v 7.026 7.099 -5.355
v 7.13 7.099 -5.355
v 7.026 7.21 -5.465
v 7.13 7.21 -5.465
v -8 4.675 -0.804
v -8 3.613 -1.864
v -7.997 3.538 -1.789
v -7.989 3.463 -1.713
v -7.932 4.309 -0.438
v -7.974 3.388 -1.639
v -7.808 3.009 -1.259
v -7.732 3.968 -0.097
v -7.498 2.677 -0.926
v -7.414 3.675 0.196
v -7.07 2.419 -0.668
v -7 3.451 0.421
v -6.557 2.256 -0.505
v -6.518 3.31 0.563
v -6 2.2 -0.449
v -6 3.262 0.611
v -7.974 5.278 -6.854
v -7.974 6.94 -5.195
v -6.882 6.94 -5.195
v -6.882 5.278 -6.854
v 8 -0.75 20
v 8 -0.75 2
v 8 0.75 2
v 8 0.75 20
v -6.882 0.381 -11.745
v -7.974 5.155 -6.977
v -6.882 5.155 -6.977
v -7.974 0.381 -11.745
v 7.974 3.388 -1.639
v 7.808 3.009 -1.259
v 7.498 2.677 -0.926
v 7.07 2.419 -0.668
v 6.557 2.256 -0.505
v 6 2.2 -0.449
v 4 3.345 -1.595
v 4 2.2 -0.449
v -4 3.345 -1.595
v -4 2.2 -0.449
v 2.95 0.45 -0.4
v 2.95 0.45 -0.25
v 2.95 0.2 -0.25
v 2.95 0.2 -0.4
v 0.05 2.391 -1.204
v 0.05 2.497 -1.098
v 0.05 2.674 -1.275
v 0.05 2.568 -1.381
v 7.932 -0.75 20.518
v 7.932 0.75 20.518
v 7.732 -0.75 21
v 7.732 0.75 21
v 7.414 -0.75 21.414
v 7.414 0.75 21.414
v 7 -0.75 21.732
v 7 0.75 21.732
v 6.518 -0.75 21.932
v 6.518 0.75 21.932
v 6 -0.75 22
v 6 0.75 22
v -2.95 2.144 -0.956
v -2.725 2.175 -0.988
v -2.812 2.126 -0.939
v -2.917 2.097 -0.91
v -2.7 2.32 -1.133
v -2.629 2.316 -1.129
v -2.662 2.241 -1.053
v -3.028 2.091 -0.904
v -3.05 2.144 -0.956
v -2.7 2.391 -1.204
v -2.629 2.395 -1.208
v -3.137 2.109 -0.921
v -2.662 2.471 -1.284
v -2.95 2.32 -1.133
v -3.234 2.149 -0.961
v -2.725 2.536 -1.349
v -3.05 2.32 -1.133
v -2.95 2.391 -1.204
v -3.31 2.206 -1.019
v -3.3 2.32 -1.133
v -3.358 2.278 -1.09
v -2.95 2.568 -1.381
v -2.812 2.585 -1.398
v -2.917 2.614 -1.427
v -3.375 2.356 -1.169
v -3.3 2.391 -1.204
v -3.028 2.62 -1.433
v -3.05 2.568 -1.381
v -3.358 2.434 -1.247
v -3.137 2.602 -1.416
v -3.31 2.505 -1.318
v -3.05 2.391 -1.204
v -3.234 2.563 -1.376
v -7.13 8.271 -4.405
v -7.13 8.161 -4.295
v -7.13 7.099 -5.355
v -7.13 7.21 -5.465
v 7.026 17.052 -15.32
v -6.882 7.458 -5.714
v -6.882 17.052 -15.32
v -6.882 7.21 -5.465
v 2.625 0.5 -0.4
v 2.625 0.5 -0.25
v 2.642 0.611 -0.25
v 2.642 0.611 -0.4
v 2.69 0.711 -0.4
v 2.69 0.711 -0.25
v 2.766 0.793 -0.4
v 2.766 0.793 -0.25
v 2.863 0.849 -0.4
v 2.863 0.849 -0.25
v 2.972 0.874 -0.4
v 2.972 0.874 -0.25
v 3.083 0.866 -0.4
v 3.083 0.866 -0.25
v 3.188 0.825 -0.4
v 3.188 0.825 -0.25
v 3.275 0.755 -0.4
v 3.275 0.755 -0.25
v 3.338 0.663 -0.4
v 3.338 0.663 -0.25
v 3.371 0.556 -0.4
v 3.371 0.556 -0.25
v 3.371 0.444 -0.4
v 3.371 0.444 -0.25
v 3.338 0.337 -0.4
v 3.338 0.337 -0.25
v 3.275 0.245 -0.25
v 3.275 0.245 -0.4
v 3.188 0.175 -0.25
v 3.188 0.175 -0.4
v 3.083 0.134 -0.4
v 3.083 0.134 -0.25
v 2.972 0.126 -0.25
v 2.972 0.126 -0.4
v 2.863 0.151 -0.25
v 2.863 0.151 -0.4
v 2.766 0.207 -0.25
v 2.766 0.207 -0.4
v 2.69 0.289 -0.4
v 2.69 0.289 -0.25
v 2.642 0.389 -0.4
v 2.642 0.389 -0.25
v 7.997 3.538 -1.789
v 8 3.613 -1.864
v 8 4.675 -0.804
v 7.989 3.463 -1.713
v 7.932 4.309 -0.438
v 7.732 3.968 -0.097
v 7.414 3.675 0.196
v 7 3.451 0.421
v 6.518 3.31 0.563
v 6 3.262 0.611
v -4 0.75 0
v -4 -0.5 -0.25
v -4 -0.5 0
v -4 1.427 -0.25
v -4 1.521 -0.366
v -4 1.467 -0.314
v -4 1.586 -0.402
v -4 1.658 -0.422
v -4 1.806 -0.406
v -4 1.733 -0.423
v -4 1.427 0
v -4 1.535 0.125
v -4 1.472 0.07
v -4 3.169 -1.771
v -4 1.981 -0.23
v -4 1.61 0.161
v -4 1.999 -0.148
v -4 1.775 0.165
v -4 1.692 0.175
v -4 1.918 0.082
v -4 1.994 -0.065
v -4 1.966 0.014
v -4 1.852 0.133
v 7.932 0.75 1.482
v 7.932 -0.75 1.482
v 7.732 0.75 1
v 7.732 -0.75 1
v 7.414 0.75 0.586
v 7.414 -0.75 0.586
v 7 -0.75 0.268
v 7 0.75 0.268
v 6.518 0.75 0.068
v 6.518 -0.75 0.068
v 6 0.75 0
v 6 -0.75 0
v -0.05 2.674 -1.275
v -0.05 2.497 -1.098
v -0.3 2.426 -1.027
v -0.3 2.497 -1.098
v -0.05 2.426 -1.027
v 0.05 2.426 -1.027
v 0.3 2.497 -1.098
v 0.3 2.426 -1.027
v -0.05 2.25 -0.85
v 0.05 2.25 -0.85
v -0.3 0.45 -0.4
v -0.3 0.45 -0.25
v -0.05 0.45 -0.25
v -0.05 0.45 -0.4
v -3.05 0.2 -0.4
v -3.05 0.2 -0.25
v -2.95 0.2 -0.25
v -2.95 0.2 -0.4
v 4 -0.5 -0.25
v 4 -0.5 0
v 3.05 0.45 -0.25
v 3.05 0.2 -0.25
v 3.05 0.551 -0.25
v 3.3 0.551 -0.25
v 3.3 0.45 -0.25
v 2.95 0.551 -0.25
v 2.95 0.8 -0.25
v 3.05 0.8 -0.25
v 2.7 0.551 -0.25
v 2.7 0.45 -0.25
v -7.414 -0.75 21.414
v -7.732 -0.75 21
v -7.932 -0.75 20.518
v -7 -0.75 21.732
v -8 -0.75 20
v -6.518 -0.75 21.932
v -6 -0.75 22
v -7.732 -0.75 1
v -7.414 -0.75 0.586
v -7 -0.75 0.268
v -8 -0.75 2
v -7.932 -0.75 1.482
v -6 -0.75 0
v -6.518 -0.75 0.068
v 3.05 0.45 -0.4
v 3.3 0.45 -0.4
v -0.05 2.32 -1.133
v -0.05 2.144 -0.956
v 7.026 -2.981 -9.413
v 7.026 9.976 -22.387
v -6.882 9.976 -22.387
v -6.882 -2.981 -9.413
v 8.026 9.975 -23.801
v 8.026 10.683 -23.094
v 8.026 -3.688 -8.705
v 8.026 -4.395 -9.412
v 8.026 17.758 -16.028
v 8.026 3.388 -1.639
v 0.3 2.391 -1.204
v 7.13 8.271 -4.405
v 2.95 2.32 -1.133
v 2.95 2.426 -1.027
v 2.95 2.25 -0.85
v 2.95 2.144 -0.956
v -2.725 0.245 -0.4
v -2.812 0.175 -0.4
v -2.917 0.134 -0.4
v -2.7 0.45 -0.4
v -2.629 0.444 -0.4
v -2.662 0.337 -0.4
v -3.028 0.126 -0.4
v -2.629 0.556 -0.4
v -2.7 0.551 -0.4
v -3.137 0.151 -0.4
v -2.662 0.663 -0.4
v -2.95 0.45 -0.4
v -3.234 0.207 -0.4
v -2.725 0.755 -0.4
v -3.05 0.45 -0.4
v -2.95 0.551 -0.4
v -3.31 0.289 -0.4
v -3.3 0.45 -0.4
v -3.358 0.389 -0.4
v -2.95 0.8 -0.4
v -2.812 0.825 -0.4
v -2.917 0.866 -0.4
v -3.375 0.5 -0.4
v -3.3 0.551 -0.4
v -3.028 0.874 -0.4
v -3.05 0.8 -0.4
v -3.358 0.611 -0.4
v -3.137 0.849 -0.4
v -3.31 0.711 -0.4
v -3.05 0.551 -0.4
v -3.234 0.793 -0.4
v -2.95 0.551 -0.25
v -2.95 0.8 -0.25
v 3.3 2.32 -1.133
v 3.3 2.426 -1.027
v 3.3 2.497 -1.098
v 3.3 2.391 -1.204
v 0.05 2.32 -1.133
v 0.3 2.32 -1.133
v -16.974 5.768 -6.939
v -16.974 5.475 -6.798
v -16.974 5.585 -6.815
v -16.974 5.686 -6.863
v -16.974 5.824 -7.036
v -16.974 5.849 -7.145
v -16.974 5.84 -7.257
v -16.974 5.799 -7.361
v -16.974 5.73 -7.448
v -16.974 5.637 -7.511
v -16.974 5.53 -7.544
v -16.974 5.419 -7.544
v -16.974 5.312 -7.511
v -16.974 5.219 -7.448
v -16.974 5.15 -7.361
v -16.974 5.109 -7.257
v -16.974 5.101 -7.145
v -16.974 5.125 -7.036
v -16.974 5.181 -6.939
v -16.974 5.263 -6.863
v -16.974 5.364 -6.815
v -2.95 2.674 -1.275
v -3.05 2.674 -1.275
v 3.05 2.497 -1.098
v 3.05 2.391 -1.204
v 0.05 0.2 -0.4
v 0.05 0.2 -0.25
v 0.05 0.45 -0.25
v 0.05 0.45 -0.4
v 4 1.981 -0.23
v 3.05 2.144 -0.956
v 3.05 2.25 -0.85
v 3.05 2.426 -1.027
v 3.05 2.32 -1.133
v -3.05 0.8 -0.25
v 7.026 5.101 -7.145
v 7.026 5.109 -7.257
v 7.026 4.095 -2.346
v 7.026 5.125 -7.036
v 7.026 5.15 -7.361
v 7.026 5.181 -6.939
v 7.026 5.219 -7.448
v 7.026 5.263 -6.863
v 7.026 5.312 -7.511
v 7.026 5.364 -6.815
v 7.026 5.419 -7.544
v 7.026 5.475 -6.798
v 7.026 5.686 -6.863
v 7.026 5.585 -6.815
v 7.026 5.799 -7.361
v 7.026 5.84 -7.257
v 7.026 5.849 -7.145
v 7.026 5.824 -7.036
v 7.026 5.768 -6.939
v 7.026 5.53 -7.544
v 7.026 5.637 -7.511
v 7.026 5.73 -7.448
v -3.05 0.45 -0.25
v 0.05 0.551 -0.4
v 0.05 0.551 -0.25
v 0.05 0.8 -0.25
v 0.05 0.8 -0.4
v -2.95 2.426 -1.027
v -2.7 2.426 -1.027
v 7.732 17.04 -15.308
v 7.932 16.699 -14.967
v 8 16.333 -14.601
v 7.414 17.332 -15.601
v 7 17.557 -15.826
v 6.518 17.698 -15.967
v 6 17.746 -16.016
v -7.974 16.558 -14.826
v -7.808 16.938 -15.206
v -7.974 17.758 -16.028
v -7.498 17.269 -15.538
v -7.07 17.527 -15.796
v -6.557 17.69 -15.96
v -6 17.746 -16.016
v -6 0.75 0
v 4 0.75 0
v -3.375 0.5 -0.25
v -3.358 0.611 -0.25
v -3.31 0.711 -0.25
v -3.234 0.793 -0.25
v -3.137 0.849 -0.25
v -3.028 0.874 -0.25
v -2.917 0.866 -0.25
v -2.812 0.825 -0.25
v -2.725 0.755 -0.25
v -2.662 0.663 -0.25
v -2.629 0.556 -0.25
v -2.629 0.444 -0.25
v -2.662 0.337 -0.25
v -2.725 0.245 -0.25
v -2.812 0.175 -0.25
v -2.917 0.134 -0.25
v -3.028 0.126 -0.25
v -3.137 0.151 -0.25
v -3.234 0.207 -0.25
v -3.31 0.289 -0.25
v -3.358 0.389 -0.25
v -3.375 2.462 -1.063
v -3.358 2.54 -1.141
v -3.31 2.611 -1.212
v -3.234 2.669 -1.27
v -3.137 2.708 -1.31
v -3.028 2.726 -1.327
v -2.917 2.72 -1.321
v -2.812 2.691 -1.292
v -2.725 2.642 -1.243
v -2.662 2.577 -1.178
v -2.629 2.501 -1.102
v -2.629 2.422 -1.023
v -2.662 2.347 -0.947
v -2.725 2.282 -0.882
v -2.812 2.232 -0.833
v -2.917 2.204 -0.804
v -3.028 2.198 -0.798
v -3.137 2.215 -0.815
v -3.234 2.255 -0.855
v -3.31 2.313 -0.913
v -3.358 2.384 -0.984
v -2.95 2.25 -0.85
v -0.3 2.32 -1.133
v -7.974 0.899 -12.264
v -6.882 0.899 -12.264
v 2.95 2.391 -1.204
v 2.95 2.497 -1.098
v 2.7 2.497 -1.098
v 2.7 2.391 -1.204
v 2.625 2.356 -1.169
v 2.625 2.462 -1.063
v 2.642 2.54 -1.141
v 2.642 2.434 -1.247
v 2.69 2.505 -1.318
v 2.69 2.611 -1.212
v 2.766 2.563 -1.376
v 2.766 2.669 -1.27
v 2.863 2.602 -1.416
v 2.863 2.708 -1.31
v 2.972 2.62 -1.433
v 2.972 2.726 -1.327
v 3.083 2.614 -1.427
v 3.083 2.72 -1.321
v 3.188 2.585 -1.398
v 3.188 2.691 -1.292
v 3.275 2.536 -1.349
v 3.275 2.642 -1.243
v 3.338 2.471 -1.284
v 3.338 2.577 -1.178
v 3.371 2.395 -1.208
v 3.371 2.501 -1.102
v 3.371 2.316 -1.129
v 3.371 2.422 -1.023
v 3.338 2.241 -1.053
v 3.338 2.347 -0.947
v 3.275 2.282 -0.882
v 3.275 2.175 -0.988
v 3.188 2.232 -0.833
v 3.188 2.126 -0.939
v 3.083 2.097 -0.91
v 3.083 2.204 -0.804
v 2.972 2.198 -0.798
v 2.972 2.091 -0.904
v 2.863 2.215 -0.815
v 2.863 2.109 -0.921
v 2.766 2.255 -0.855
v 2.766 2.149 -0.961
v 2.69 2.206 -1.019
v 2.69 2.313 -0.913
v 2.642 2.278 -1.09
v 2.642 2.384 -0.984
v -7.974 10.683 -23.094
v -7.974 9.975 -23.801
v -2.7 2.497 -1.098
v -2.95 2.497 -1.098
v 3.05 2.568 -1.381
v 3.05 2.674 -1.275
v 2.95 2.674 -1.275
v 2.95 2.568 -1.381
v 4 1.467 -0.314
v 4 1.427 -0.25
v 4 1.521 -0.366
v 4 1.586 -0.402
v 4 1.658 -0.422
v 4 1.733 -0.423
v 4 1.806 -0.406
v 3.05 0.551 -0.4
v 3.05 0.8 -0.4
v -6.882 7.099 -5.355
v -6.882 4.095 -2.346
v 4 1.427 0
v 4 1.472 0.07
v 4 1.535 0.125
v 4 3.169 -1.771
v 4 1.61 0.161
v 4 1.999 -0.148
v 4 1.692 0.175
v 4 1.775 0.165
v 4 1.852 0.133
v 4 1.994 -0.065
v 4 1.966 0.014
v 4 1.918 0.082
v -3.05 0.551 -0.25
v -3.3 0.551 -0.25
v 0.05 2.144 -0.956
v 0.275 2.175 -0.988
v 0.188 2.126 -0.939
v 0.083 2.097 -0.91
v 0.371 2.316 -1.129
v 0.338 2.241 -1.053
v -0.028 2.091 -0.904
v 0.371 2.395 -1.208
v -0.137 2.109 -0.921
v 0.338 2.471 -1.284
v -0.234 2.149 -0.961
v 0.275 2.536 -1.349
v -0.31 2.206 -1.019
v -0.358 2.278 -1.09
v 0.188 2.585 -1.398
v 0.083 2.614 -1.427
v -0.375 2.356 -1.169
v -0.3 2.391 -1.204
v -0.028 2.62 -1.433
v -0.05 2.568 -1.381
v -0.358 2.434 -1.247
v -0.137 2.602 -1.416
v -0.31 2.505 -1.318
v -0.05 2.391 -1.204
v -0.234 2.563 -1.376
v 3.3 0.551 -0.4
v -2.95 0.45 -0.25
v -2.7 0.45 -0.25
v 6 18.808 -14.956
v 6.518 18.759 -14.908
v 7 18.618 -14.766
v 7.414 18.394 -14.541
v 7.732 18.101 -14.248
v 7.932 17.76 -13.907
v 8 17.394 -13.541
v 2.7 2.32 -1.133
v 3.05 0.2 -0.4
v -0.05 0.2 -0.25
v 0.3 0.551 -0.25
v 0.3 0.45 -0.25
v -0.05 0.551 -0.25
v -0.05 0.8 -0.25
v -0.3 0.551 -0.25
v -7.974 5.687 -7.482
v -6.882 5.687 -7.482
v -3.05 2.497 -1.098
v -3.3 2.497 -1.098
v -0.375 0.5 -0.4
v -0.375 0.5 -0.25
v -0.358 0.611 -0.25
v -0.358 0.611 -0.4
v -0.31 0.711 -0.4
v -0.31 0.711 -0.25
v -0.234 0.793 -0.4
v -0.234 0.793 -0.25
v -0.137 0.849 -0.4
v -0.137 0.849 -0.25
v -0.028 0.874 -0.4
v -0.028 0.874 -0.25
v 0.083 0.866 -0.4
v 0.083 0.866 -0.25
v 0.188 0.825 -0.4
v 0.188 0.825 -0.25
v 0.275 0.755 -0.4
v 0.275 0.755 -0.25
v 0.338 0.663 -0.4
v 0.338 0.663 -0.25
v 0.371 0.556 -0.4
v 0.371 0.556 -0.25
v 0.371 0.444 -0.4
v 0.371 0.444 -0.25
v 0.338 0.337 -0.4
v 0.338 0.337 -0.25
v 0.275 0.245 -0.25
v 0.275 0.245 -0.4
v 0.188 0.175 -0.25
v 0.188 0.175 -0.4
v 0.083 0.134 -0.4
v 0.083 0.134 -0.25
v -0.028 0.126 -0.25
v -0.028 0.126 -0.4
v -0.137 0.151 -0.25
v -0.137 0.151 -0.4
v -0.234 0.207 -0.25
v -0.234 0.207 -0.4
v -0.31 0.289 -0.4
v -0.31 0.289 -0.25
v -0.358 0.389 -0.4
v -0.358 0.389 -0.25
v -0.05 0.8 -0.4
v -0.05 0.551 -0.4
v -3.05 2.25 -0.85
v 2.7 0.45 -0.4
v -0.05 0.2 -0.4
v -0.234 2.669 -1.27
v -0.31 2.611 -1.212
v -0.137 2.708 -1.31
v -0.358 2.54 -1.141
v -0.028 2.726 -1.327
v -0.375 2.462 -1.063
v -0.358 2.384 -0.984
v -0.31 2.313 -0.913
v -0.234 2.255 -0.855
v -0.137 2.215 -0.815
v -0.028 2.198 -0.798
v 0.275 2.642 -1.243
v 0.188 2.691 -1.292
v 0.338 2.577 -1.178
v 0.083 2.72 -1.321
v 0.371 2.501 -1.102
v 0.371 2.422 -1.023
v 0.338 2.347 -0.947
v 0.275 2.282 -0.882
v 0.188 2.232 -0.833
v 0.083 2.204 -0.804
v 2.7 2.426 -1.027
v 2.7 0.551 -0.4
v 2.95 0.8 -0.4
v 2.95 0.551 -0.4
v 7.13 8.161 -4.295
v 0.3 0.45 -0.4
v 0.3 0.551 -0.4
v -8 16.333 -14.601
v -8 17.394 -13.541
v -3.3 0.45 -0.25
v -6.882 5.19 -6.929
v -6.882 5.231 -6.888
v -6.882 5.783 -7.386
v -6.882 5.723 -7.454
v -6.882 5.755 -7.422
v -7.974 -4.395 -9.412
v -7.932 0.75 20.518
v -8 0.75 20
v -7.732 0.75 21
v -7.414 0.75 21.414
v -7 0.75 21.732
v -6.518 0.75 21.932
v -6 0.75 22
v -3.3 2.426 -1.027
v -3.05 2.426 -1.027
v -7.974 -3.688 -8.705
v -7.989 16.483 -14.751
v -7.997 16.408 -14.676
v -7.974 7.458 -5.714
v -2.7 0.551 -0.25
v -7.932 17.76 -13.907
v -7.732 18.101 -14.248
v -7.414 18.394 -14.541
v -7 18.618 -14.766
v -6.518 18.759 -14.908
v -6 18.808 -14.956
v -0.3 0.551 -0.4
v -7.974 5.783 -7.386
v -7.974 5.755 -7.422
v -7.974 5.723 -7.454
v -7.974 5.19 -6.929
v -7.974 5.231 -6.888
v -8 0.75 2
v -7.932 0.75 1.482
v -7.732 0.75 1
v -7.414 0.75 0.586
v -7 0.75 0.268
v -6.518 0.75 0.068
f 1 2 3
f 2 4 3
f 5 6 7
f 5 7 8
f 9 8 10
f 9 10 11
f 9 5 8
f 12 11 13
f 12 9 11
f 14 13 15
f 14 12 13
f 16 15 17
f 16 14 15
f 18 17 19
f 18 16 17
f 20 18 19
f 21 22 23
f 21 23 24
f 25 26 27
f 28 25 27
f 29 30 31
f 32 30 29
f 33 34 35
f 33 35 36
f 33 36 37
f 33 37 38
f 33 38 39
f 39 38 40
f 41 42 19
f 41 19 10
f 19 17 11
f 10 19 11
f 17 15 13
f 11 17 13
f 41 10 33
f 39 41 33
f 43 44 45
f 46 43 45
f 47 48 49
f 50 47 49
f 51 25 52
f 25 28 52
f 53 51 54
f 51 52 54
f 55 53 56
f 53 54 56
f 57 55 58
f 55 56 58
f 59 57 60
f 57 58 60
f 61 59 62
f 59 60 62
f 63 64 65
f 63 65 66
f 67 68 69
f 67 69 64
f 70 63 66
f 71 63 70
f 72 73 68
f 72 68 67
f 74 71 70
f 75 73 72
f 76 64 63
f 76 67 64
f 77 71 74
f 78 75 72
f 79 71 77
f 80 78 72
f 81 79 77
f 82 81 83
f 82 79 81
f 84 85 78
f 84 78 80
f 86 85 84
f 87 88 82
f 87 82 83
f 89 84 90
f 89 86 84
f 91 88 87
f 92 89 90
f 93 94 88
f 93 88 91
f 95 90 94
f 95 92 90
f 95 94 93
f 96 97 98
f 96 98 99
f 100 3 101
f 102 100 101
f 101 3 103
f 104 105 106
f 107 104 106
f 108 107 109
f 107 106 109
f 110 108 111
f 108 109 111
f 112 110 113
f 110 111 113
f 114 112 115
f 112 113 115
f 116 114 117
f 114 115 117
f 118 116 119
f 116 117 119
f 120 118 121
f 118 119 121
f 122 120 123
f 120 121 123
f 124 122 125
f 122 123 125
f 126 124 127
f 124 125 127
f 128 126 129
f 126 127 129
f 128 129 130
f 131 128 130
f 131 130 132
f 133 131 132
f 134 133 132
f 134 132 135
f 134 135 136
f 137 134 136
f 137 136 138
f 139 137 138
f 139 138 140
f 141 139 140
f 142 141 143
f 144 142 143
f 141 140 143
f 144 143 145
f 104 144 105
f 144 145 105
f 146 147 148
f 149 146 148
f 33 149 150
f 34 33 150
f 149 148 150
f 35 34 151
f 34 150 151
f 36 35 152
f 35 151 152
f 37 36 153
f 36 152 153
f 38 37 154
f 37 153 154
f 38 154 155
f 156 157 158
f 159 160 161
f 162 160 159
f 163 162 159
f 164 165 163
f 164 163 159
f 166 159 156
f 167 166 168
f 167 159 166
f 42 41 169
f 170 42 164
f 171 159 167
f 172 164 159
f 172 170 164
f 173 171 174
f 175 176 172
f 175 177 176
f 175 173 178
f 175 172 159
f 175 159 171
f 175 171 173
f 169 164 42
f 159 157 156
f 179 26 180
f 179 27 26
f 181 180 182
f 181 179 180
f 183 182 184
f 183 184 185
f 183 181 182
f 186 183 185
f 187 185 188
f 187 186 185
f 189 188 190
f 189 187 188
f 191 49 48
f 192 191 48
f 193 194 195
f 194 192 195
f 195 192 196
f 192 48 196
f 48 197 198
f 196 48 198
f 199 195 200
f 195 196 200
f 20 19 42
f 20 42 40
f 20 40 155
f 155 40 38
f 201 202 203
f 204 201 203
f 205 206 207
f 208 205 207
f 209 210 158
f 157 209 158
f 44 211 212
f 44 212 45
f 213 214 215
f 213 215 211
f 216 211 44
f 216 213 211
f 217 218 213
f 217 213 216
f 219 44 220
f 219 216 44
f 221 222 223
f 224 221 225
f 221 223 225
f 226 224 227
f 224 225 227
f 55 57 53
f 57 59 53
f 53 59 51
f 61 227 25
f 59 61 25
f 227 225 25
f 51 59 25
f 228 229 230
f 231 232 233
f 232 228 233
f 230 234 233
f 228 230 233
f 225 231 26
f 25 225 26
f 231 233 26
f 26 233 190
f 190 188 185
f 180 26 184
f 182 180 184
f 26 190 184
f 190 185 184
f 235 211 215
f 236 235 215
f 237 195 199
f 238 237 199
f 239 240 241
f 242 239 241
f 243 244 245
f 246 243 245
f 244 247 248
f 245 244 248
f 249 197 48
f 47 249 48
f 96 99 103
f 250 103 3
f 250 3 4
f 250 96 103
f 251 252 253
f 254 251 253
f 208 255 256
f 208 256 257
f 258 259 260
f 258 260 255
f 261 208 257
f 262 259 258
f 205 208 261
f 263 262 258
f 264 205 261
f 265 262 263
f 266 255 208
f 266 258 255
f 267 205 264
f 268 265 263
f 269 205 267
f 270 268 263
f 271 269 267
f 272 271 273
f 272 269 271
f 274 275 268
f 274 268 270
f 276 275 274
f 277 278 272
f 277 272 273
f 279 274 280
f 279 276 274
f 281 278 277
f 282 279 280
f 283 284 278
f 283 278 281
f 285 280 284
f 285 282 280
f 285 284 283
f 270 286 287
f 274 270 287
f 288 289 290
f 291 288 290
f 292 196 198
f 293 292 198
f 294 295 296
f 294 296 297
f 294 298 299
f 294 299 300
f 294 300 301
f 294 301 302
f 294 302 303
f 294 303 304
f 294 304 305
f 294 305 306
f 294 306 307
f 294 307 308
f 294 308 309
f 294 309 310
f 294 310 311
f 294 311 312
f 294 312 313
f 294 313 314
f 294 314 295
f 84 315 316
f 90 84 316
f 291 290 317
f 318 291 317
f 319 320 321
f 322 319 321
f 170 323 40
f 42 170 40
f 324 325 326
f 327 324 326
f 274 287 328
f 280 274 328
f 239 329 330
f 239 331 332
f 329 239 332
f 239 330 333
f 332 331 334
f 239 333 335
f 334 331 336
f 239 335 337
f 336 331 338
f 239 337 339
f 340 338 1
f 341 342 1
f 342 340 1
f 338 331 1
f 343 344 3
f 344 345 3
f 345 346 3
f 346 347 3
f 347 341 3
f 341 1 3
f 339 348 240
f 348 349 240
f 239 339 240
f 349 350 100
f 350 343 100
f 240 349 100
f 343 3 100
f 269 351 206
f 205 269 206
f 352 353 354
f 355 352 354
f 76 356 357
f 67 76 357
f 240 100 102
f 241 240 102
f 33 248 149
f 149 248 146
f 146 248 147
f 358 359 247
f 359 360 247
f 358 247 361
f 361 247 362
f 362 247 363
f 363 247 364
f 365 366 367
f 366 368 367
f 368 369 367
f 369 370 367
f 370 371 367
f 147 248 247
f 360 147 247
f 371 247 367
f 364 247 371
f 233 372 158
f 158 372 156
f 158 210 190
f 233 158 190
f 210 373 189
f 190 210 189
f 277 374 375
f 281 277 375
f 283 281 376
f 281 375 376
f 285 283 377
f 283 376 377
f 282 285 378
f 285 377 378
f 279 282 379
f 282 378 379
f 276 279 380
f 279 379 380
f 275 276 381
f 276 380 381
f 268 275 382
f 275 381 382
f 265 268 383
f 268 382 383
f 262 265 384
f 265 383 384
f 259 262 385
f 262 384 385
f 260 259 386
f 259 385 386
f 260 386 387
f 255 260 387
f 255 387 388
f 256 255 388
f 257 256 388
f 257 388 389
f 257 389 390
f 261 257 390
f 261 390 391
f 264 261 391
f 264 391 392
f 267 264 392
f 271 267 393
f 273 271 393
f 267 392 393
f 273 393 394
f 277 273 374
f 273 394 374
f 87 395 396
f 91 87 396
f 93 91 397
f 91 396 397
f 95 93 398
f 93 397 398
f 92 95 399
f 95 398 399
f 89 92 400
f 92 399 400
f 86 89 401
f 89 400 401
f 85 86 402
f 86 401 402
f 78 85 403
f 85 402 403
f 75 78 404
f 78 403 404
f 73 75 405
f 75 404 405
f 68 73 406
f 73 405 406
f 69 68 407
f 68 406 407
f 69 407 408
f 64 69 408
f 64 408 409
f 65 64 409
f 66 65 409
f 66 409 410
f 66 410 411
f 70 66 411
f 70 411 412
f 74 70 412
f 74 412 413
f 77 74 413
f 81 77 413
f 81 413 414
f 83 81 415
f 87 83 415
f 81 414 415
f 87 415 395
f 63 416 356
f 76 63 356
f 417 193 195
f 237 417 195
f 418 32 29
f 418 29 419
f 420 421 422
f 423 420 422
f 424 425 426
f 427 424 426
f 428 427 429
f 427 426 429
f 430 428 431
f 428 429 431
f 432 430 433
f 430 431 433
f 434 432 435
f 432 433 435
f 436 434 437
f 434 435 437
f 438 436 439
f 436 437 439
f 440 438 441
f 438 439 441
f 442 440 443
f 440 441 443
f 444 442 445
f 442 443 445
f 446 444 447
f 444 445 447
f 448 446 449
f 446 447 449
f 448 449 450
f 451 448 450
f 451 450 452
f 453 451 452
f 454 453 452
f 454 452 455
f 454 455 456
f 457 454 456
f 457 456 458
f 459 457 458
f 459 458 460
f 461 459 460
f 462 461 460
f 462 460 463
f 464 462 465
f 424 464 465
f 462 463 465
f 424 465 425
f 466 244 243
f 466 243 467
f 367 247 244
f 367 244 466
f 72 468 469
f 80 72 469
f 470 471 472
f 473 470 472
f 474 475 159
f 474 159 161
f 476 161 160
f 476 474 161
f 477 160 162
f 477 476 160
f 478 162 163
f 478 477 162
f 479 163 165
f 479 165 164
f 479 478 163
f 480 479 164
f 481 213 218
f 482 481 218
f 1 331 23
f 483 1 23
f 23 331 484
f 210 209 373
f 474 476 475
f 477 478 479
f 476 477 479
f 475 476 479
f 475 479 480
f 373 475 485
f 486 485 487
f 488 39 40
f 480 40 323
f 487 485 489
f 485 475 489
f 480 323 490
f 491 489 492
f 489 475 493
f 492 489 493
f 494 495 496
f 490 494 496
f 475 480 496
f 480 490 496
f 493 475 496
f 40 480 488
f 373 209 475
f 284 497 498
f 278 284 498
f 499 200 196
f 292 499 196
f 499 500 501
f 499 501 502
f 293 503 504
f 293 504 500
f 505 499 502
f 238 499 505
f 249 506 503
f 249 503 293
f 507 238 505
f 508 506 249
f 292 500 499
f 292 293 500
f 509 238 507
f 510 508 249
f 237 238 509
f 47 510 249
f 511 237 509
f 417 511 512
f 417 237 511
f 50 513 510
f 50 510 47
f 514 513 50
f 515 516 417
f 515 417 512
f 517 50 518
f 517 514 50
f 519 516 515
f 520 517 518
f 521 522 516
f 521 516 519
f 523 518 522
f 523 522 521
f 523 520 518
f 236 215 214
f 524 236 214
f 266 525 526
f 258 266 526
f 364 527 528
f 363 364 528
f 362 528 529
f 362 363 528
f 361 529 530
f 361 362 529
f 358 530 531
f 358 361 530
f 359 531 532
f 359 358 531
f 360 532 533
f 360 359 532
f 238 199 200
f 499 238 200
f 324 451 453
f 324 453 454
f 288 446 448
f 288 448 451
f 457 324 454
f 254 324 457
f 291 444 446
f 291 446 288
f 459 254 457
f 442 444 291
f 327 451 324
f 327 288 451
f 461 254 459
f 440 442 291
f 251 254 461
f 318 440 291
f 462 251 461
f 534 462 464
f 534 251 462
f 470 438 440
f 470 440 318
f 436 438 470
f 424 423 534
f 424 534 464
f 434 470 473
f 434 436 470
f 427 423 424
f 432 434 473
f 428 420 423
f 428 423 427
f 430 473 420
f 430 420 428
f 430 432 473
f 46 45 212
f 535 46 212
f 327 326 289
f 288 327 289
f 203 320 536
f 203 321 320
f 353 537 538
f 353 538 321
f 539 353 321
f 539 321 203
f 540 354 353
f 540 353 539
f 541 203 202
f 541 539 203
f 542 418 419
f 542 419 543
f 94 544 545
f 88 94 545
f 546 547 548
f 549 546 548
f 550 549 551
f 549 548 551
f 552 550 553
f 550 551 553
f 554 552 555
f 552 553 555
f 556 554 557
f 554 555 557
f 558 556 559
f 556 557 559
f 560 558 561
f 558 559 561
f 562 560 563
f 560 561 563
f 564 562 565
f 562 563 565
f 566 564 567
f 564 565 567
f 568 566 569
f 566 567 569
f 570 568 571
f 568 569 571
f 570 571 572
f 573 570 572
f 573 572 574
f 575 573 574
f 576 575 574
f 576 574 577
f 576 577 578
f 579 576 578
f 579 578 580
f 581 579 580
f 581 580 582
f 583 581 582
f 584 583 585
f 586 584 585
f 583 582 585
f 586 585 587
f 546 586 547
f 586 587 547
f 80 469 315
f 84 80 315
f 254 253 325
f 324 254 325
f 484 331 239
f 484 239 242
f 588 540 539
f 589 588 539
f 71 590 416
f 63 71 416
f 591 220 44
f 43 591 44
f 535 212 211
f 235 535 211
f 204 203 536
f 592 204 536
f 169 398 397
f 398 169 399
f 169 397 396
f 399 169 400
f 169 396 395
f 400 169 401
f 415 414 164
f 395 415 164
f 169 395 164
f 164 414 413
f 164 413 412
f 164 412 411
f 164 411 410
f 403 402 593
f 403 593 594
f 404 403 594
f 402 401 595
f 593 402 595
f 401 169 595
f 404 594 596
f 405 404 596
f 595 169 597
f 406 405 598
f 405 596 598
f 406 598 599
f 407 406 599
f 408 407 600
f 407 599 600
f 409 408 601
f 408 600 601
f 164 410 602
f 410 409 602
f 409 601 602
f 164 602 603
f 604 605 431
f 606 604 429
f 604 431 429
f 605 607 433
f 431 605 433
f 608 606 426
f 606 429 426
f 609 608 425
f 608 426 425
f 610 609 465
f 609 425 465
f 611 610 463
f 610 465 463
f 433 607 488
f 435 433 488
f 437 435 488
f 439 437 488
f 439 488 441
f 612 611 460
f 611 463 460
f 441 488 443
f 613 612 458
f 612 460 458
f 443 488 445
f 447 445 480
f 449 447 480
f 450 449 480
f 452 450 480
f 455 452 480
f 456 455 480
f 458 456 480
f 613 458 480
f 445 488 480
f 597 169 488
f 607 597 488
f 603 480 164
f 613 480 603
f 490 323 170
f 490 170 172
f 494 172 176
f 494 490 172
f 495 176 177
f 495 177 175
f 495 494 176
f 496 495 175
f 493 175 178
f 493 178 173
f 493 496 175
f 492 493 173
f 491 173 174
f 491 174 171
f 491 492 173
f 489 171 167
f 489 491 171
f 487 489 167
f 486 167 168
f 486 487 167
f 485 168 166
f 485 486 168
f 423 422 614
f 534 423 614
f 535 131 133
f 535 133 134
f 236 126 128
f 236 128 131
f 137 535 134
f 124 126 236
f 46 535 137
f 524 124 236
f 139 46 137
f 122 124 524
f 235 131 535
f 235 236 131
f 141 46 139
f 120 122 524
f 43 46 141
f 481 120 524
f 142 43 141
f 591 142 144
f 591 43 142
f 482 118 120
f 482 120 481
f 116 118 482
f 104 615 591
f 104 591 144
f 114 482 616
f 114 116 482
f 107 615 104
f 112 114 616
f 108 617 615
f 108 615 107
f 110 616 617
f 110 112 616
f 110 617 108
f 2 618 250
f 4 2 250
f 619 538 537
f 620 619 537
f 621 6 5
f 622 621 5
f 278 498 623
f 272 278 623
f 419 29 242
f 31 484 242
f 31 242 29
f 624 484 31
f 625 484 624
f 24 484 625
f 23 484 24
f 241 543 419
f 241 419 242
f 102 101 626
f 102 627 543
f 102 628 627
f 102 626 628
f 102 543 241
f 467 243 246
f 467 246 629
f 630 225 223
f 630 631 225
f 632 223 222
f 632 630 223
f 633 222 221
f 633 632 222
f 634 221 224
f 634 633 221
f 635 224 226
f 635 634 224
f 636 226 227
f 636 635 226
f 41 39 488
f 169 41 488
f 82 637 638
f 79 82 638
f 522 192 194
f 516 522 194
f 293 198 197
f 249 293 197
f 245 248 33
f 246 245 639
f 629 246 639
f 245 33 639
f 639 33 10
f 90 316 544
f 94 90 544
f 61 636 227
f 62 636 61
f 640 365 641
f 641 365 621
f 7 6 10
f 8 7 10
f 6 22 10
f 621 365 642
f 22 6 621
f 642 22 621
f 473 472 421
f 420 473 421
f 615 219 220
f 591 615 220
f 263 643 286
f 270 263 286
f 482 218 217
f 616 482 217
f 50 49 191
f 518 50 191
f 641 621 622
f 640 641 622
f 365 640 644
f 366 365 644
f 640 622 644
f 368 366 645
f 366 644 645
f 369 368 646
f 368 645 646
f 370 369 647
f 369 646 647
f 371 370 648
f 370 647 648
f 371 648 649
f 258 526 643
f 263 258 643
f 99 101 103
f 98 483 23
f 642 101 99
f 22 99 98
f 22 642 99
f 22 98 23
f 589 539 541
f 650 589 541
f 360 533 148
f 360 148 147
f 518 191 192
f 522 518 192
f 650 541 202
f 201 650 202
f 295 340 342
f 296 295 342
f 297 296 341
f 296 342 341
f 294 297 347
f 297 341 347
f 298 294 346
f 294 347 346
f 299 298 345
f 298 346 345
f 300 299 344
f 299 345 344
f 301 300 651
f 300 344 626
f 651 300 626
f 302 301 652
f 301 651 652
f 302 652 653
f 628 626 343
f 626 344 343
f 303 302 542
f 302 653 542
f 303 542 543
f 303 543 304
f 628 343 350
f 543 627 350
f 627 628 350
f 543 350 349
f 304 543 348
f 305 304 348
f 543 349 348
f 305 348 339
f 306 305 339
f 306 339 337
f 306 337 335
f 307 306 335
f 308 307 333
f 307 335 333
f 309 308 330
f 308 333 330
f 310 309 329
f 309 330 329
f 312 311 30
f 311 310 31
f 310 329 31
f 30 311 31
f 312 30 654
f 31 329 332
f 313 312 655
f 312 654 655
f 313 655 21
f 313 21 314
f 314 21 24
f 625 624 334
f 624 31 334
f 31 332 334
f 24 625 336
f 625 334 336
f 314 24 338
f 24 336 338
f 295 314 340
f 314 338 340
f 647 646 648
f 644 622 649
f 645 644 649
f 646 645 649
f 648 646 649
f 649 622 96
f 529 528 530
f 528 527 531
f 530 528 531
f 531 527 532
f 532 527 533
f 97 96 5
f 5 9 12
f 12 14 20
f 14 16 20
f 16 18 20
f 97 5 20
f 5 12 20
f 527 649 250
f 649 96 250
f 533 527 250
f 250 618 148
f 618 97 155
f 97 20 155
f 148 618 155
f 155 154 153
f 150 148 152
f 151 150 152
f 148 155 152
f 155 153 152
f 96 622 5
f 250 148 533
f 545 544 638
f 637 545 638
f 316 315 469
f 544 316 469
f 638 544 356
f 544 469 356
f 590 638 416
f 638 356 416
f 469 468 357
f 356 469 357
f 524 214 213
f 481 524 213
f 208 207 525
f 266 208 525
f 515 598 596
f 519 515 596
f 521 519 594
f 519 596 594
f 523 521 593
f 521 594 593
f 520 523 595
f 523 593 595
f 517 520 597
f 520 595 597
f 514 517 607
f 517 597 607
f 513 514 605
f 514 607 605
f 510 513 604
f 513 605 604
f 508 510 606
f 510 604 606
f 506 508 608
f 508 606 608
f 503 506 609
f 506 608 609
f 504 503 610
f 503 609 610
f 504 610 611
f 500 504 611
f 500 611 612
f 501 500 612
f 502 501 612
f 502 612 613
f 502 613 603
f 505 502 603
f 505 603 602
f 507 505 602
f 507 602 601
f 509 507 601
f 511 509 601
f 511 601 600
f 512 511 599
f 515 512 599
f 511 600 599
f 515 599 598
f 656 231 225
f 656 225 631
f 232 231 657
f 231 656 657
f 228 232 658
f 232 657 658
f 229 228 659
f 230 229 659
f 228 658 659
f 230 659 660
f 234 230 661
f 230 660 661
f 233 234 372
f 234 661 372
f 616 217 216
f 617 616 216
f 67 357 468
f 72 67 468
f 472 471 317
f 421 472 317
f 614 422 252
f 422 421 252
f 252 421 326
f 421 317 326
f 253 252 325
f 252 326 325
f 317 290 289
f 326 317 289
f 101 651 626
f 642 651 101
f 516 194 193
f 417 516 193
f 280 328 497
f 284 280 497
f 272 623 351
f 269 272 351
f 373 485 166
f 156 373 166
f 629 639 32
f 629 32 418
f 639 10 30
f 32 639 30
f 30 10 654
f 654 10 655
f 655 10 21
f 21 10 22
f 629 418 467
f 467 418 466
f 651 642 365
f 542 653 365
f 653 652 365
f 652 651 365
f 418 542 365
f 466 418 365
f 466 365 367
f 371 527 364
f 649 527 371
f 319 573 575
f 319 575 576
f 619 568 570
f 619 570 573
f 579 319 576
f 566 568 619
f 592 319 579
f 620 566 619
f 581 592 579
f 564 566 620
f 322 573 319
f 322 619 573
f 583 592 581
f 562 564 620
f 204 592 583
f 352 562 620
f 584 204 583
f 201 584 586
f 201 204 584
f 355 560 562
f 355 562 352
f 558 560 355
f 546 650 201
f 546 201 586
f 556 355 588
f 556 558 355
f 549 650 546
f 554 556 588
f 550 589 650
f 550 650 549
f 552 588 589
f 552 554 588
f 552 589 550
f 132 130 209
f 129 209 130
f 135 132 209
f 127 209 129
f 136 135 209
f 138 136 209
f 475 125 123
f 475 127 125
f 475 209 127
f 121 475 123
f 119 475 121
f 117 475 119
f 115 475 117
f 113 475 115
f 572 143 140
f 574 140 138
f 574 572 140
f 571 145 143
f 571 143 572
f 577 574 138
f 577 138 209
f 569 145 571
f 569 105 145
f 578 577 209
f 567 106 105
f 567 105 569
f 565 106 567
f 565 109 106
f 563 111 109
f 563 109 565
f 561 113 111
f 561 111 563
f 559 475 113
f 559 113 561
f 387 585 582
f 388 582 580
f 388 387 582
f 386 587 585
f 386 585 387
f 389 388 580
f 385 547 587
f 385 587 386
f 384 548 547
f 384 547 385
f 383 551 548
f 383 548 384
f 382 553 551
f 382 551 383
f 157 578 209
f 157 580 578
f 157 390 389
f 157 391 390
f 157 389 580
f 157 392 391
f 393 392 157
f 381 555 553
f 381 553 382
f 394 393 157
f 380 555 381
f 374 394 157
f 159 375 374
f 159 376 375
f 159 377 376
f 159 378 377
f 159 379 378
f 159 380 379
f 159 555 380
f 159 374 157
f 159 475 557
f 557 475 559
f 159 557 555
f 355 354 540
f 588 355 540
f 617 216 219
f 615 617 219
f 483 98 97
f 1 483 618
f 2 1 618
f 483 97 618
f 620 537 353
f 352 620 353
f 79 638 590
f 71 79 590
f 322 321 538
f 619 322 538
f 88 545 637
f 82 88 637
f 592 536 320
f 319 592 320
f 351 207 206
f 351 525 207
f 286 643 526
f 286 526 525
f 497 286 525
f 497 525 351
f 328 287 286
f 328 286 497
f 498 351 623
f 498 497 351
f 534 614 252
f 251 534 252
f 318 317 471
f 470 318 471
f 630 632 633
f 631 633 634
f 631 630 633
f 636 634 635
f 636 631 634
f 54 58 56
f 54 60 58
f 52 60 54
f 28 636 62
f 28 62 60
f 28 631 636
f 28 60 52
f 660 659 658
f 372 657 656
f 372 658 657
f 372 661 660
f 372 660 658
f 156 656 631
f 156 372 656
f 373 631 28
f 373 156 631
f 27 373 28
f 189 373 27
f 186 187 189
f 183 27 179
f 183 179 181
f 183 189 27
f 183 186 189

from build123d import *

# Parameters (mm, degrees)
SKETCH1_W            = 16
SKETCH1_H            = 1.5
BOSS_EXTRUDE1_DEPTH  = 22
FILLET1_R            = 2
SKETCH2_W            = 8
SKETCH2_H            = 2
BOSS_EXTRUDE2_DEPTH  = 0.25
SKETCH3_R            = 0.375
BOSS_EXTRUDE3_DEPTH  = 0.15
SKETCH4_R            = 0.3
BOSS_EXTRUDE4_DEPTH  = 8
BOSS_EXTRUDE5_DEPTH  = 8
SKETCH6_R            = 0.375
BOSS_EXTRUDE6_DEPTH  = 0.15
SKETCH7_W            = 16
SKETCH7_H            = 1.5
BOSS_EXTRUDE7_DEPTH  = 1.5
BOSS_EXTRUDE8_DEPTH  = 20.5
FILLET2_R            = 2
SKETCH9_W            = 14.259338364
SKETCH9_H            = 0.156424717
CUT_EXTRUDE1_DEPTH   = 20.5
SKETCH10_W           = 16
SKETCH10_H           = 20.335857824
SKETCH10_W_2         = 13.907599839
SKETCH10_H_2         = 18.335857824
BOSS_EXTRUDE9_DEPTH  = 10
SKETCH11_W           = 16
SKETCH11_H           = 20.335857824
BOSS_EXTRUDE10_DEPTH = 1
CUT_EXTRUDE2_DEPTH   = 11
SKETCH13_R           = 0.375
BOSS_EXTRUDE11_DEPTH = 25


with BuildPart() as part:
    # Sketch1 → Boss-Extrude1 (new body)
    with BuildSketch(Plane.XY):
        Rectangle(SKETCH1_W, SKETCH1_H)
    extrude(amount=BOSS_EXTRUDE1_DEPTH)

    # Fillet1
    fillet1_edges = [part.edges().sort_by_distance(p)[0] for p in [
        (-8, 0, 22),
        (8, 0, 22),
        (-8, 0, 0),
        (8, 0, 0),
    ]]
    fillet(fillet1_edges, radius=FILLET1_R)

    # Sketch2 → Boss-Extrude2 (add)
    with BuildSketch(Plane(origin=(0, 0, 0), x_dir=(-1, 0, 0), z_dir=(0, 0, -1))):
        with Locations((0, 0.5)):
            Rectangle(SKETCH2_W, SKETCH2_H)
    extrude(amount=BOSS_EXTRUDE2_DEPTH)

    # Sketch3 → Boss-Extrude3 (add)
    with BuildSketch(Plane(origin=(0, 0, -0.25), x_dir=(-1, 0, 0), z_dir=(0, 0, -1))):
        with Locations((-3, 0.5)):
            Circle(SKETCH3_R)
        Polygon((-3.05, 0.551330007), (-3.05, 0.800158256), (-2.95, 0.800158256), (-2.95, 0.551330007), (-2.7, 0.551330007), (-2.7, 0.45), (-2.95, 0.45), (-2.95, 0.2), (-3.05, 0.2), (-3.05, 0.45), (-3.3, 0.45), (-3.3, 0.551330007), align=None, mode=Mode.SUBTRACT)
        with Locations((0, 0.5)):
            Circle(SKETCH3_R)
        Polygon((-0.05, 0.2), (-0.05, 0.45), (-0.3, 0.45), (-0.3, 0.551330007), (-0.05, 0.551330007), (-0.05, 0.800158256), (0.05, 0.800158256), (0.05, 0.551330007), (0.3, 0.551330007), (0.3, 0.45), (0.05, 0.45), (0.05, 0.2), align=None, mode=Mode.SUBTRACT)
        with Locations((3, 0.5)):
            Circle(SKETCH3_R)
        Polygon((2.95, 0.2), (2.95, 0.45), (2.7, 0.45), (2.7, 0.551330007), (2.95, 0.551330007), (2.95, 0.800158256), (3.05, 0.800158256), (3.05, 0.551330007), (3.3, 0.551330007), (3.3, 0.45), (3.05, 0.45), (3.05, 0.2), align=None, mode=Mode.SUBTRACT)
    extrude(amount=BOSS_EXTRUDE3_DEPTH)

    # Sketch4 → Boss-Extrude4 (add)
    with BuildSketch(Plane(origin=(4, 0, 0), x_dir=(0, 0, -1), z_dir=(1, 0, 0))):
        with Locations((0.125, 1.7)):
            Circle(SKETCH4_R)
    extrude(amount=-BOSS_EXTRUDE4_DEPTH)

    # Sketch5 → Boss-Extrude5 (add)
    with BuildSketch(Plane(origin=(4, 0, 0), x_dir=(0, 0, -1), z_dir=(1, 0, 0))):
        Polygon((1.595306779, 3.344927555), (1.771017264, 3.168973693), (0.348913537, 1.749477894), (0.173440849, 1.924950583), align=None)
    extrude(amount=-BOSS_EXTRUDE5_DEPTH)

    # Sketch6 → Boss-Extrude6 (add)
    with BuildSketch(Plane(origin=(0, 0.701888086, 0.700600926), x_dir=(-1, 0, 0), z_dir=(0, -0.707755443, -0.706457524))):
        with Locations((3, 2.491187613)):
            Circle(SKETCH6_R)
        Polygon((2.95, 2.541187613), (2.95, 2.791187613), (3.05, 2.791187613), (3.05, 2.541187613), (3.3, 2.541187613), (3.3, 2.441187613), (3.05, 2.441187613), (3.05, 2.191187613), (2.95, 2.191187613), (2.95, 2.441187613), (2.7, 2.441187613), (2.7, 2.541187613), align=None, mode=Mode.SUBTRACT)
        with Locations((0, 2.491187613)):
            Circle(SKETCH6_R)
        Polygon((0.05, 2.441187613), (0.05, 2.191187613), (-0.05, 2.191187613), (-0.05, 2.441187613), (-0.3, 2.441187613), (-0.3, 2.541187613), (-0.05, 2.541187613), (-0.05, 2.791187613), (0.05, 2.791187613), (0.05, 2.541187613), (0.3, 2.541187613), (0.3, 2.441187613), align=None, mode=Mode.SUBTRACT)
        with Locations((-3, 2.491187613)):
            Circle(SKETCH6_R)
        Polygon((-2.95, 2.441187613), (-2.95, 2.191187613), (-3.05, 2.191187613), (-3.05, 2.441187613), (-3.3, 2.441187613), (-3.3, 2.541187613), (-3.05, 2.541187613), (-3.05, 2.791187613), (-2.95, 2.791187613), (-2.95, 2.541187613), (-2.7, 2.541187613), (-2.7, 2.441187613), align=None, mode=Mode.SUBTRACT)
    extrude(amount=BOSS_EXTRUDE6_DEPTH)

    # Sketch7 → Boss-Extrude7 (add)
    with BuildSketch(Plane(origin=(0, 0.877034448, 0.875869302), x_dir=(1, 0, 0), z_dir=(0, 0.707576635, 0.706636615))):
        with Locations((0, 2.622450086)):
            Rectangle(SKETCH7_W, SKETCH7_H)
    extrude(amount=BOSS_EXTRUDE7_DEPTH)

    # Sketch8 → Boss-Extrude8 (add)
    with BuildSketch(Plane(origin=(0, 2.383096713, -2.386266884), x_dir=(-1, 0, 0), z_dir=(0, 0.706636615, -0.707576635))):
        Polygon((-8, 1.239490402), (-4, 1.239490402), (4, 1.239490402), (8, 1.239490402), (8, 2.739490402), (-8, 2.739490402), align=None)
    extrude(amount=BOSS_EXTRUDE8_DEPTH)

    # Fillet2
    fillet2_edges = [part.edges().sort_by_distance(p)[0] for p in [
        (8, 2.730858715, 0.080944831),
        (-8, 2.730858715, 0.080944831),
        (8, 18.276864241, -15.485741141),
        (-8, 18.276864241, -15.485741141),
    ]]
    fillet(fillet2_edges, radius=FILLET2_R)

    # Sketch9 → Cut-Extrude1 (cut)
    with BuildSketch(Plane(origin=(0, 1.938399401, 1.935824224), x_dir=(1, 0, 0), z_dir=(0, 0.707576635, 0.706636615))):
        with Locations((0, 8.883775495)):
            Rectangle(SKETCH9_W, SKETCH9_H)
    extrude(amount=-CUT_EXTRUDE1_DEPTH, mode=Mode.SUBTRACT)

    # Sketch10 → Boss-Extrude9 (add)
    with BuildSketch(Plane(origin=(0, 0.877034448, 0.875869302), x_dir=(-1, 0, 0), z_dir=(0, -0.707576635, -0.706636615))):
        with Locations((-0.025561506, 13.721643007)):
            Rectangle(SKETCH10_W, SKETCH10_H)
        with Locations((-0.071761587, 13.721643007)):
            Rectangle(SKETCH10_W_2, SKETCH10_H_2, mode=Mode.SUBTRACT)
    extrude(amount=BOSS_EXTRUDE9_DEPTH)

    # Sketch11 → Boss-Extrude10 (add)
    with BuildSketch(Plane(origin=(0, -6.198731903, -6.190496846), x_dir=(-1, 0, 0), z_dir=(0, -0.707576635, -0.706636615))):
        with Locations((-0.025561506, 13.721643007)):
            Rectangle(SKETCH11_W, SKETCH11_H)
    extrude(amount=BOSS_EXTRUDE10_DEPTH)

    # Sketch12 → Cut-Extrude2 (cut)
    with BuildSketch(Plane.ZY.offset(7.974438494)):
        Polygon((-5.194715869, 6.939554806), (-11.745034119, 0.380522838), (-12.264104898, 0.898904028), (-5.713786648, 7.457935996), align=None)
    extrude(amount=-CUT_EXTRUDE2_DEPTH, mode=Mode.SUBTRACT)

    # Sketch13 → Boss-Extrude11 (add)
    with BuildSketch(Plane.ZY.offset(-8.025561506)):
        with Locations((-7.173250291, 5.474563224)):
            Circle(SKETCH13_R)
    extrude(amount=BOSS_EXTRUDE11_DEPTH)


solid = part.part
